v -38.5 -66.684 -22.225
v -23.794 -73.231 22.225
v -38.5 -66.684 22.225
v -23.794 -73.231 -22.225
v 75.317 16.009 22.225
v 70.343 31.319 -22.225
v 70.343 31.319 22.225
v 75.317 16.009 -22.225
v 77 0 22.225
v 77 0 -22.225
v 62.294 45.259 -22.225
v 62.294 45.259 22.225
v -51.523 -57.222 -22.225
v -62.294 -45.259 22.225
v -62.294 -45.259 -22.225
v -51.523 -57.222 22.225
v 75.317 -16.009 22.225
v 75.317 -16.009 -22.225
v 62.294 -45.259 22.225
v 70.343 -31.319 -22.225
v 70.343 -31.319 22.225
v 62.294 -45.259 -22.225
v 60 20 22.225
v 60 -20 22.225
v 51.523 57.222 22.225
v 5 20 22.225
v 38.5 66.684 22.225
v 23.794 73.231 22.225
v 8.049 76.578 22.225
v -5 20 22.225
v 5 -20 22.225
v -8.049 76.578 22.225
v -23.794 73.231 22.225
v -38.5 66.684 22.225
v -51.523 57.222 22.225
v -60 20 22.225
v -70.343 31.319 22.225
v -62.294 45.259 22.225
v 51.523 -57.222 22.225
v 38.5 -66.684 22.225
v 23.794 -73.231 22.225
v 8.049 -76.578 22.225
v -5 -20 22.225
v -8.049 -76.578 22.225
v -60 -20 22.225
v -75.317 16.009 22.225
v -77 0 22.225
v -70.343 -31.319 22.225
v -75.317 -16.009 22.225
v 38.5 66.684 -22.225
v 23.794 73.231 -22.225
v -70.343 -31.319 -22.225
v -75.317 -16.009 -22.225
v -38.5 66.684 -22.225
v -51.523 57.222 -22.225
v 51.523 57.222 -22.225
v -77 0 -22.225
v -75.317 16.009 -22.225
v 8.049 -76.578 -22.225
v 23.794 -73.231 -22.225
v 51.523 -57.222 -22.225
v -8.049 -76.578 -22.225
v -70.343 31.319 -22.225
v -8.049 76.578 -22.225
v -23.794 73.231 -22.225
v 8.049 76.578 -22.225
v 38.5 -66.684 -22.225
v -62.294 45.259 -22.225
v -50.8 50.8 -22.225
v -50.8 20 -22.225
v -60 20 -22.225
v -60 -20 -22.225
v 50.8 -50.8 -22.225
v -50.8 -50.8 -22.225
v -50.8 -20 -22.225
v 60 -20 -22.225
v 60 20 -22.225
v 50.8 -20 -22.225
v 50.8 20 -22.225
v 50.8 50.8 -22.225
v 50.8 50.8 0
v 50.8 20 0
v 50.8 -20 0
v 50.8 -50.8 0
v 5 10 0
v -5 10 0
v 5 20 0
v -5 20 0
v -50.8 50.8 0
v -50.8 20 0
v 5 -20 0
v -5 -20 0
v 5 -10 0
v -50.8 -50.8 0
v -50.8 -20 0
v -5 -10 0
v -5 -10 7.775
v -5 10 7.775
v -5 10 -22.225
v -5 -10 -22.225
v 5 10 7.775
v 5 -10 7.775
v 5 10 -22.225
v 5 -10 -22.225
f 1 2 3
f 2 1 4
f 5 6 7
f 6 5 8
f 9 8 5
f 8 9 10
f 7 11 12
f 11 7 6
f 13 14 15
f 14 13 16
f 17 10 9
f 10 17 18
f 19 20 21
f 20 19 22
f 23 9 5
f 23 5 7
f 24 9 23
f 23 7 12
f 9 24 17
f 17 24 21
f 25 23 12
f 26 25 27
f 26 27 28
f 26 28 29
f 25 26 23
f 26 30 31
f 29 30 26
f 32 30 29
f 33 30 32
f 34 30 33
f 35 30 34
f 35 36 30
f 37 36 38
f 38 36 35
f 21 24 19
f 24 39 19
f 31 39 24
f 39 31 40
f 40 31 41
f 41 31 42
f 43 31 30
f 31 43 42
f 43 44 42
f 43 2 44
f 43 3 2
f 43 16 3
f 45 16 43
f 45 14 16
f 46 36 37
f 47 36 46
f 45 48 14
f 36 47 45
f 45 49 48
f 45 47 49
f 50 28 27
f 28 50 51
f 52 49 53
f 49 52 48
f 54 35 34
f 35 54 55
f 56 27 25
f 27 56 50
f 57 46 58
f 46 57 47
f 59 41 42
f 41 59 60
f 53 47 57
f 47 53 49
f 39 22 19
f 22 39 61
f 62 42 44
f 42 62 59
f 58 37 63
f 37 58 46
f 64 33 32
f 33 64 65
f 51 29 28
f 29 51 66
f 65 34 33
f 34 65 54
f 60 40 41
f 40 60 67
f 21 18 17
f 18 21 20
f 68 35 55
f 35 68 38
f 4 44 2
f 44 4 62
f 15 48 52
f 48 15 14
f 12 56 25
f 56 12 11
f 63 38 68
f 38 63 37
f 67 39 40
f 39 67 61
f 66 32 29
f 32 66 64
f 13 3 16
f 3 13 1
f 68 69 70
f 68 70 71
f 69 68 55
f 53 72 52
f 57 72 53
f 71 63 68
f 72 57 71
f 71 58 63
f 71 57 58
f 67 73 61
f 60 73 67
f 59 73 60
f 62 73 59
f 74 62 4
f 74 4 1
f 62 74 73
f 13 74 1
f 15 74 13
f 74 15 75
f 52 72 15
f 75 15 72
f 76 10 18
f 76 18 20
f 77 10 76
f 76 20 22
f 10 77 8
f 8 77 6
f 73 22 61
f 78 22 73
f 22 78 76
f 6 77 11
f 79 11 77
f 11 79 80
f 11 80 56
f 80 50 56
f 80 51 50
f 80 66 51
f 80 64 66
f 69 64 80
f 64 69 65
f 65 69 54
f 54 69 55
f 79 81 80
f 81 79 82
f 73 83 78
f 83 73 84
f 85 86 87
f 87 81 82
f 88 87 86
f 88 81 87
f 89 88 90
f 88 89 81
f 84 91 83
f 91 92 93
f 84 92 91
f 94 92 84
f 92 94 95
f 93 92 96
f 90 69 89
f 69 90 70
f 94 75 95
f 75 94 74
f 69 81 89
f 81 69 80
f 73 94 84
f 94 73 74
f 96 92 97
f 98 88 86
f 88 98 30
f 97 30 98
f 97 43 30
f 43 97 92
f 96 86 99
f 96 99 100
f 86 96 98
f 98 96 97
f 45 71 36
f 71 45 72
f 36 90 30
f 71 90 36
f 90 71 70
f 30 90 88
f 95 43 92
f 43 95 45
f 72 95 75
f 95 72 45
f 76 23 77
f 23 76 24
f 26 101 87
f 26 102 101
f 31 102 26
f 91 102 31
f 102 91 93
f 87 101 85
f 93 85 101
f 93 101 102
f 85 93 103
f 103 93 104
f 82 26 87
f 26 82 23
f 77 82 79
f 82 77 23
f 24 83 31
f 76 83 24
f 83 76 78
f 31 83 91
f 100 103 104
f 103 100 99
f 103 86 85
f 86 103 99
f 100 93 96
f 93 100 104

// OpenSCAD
//main body
difference(){
    
    cylinder(44.45,77,77,true);
    // square hole in middle
    translate([0,0,-22.225])
        cube([101.6,101.6,44.45], true);
    //square extension L
    translate([-60, -20, -44.45])
    cube([55,40,88.9], false);
    //square extension R
    translate([5, -20, -44.45])
        cube([55,40,88.9], false);
    //another hole in the middle
    //cube([70,50,45], true);
    /*hole 1 in corner
    translate([-38, -38, 0])
        cylinder(500, 12, 12, true);
    //hole 2 in corner
    translate([-38, 38, 0])
        cylinder(500, 12, 12, true);
    //hole 3 in corner
    translate([38, -38, 0])
        cylinder(500, 12, 12, true);
    //hole 4 in corner
    translate([38, 38, 0])
        cylinder(500, 12, 12, true);*/
}
//center motor mounter
translate([-5, -10, -22.225])
    cube([10, 20, 30], false);
/*main motor left
rotate([0,90,0])
    translate([15, 0, -25.45])
cylinder(40.9, 8, 8, true);
//main motor right
rotate([0,90,0])
    translate([15, 0, 25.45])
cylinder(40.9, 8, 8, true);
/*motor turnything left
rotate([90,0,0])
    translate([0,-75, -185]) 
    cylinder(40, 10, 10, $fn=6, true);
//motor turnything right
rotate([90,0,0])
    translate([0,-75, 185]) 
    cylinder(40, 10, 10, $fn=6, true);
//wheel left
rotate([0, 90, 0])
    translate([15, 0, -51])
    cylinder(11.303, 19.05, 19.05, true);
//wheel left
rotate([0, 90, 0])
    translate([15, 0, 51])
    cylinder(11.303, 19.05, 19.05, true);
//caster
rotate([0, 90, 0])
    translate([15, 31, 0])
    cylinder(11.303, 19.05, 19.05, true);
//controller
    translate([0,0,44.45])
        cube([101.6,101.6,44.45], true);
//ir sensor FL
rotate([0,0,45])
translate([-5, 75, 20])
    cube([20, 5, 40], true);
//ir sensor FR
rotate([0,0,-45])
translate([5, 75, 20])
    cube([20, 5, 40], true);
//ir sensor F
translate([0, 75, 20])
    cube([20, 5, 40], true);
//ir sensor L
rotate([0, 0, 90])
    translate([0, 75, 20])
        cube([20, 5, 40], true);
//ir sensor R
rotate([0, 0, 90])
    translate([0, -75, 20])
        cube([20, 5, 40], true);*/
